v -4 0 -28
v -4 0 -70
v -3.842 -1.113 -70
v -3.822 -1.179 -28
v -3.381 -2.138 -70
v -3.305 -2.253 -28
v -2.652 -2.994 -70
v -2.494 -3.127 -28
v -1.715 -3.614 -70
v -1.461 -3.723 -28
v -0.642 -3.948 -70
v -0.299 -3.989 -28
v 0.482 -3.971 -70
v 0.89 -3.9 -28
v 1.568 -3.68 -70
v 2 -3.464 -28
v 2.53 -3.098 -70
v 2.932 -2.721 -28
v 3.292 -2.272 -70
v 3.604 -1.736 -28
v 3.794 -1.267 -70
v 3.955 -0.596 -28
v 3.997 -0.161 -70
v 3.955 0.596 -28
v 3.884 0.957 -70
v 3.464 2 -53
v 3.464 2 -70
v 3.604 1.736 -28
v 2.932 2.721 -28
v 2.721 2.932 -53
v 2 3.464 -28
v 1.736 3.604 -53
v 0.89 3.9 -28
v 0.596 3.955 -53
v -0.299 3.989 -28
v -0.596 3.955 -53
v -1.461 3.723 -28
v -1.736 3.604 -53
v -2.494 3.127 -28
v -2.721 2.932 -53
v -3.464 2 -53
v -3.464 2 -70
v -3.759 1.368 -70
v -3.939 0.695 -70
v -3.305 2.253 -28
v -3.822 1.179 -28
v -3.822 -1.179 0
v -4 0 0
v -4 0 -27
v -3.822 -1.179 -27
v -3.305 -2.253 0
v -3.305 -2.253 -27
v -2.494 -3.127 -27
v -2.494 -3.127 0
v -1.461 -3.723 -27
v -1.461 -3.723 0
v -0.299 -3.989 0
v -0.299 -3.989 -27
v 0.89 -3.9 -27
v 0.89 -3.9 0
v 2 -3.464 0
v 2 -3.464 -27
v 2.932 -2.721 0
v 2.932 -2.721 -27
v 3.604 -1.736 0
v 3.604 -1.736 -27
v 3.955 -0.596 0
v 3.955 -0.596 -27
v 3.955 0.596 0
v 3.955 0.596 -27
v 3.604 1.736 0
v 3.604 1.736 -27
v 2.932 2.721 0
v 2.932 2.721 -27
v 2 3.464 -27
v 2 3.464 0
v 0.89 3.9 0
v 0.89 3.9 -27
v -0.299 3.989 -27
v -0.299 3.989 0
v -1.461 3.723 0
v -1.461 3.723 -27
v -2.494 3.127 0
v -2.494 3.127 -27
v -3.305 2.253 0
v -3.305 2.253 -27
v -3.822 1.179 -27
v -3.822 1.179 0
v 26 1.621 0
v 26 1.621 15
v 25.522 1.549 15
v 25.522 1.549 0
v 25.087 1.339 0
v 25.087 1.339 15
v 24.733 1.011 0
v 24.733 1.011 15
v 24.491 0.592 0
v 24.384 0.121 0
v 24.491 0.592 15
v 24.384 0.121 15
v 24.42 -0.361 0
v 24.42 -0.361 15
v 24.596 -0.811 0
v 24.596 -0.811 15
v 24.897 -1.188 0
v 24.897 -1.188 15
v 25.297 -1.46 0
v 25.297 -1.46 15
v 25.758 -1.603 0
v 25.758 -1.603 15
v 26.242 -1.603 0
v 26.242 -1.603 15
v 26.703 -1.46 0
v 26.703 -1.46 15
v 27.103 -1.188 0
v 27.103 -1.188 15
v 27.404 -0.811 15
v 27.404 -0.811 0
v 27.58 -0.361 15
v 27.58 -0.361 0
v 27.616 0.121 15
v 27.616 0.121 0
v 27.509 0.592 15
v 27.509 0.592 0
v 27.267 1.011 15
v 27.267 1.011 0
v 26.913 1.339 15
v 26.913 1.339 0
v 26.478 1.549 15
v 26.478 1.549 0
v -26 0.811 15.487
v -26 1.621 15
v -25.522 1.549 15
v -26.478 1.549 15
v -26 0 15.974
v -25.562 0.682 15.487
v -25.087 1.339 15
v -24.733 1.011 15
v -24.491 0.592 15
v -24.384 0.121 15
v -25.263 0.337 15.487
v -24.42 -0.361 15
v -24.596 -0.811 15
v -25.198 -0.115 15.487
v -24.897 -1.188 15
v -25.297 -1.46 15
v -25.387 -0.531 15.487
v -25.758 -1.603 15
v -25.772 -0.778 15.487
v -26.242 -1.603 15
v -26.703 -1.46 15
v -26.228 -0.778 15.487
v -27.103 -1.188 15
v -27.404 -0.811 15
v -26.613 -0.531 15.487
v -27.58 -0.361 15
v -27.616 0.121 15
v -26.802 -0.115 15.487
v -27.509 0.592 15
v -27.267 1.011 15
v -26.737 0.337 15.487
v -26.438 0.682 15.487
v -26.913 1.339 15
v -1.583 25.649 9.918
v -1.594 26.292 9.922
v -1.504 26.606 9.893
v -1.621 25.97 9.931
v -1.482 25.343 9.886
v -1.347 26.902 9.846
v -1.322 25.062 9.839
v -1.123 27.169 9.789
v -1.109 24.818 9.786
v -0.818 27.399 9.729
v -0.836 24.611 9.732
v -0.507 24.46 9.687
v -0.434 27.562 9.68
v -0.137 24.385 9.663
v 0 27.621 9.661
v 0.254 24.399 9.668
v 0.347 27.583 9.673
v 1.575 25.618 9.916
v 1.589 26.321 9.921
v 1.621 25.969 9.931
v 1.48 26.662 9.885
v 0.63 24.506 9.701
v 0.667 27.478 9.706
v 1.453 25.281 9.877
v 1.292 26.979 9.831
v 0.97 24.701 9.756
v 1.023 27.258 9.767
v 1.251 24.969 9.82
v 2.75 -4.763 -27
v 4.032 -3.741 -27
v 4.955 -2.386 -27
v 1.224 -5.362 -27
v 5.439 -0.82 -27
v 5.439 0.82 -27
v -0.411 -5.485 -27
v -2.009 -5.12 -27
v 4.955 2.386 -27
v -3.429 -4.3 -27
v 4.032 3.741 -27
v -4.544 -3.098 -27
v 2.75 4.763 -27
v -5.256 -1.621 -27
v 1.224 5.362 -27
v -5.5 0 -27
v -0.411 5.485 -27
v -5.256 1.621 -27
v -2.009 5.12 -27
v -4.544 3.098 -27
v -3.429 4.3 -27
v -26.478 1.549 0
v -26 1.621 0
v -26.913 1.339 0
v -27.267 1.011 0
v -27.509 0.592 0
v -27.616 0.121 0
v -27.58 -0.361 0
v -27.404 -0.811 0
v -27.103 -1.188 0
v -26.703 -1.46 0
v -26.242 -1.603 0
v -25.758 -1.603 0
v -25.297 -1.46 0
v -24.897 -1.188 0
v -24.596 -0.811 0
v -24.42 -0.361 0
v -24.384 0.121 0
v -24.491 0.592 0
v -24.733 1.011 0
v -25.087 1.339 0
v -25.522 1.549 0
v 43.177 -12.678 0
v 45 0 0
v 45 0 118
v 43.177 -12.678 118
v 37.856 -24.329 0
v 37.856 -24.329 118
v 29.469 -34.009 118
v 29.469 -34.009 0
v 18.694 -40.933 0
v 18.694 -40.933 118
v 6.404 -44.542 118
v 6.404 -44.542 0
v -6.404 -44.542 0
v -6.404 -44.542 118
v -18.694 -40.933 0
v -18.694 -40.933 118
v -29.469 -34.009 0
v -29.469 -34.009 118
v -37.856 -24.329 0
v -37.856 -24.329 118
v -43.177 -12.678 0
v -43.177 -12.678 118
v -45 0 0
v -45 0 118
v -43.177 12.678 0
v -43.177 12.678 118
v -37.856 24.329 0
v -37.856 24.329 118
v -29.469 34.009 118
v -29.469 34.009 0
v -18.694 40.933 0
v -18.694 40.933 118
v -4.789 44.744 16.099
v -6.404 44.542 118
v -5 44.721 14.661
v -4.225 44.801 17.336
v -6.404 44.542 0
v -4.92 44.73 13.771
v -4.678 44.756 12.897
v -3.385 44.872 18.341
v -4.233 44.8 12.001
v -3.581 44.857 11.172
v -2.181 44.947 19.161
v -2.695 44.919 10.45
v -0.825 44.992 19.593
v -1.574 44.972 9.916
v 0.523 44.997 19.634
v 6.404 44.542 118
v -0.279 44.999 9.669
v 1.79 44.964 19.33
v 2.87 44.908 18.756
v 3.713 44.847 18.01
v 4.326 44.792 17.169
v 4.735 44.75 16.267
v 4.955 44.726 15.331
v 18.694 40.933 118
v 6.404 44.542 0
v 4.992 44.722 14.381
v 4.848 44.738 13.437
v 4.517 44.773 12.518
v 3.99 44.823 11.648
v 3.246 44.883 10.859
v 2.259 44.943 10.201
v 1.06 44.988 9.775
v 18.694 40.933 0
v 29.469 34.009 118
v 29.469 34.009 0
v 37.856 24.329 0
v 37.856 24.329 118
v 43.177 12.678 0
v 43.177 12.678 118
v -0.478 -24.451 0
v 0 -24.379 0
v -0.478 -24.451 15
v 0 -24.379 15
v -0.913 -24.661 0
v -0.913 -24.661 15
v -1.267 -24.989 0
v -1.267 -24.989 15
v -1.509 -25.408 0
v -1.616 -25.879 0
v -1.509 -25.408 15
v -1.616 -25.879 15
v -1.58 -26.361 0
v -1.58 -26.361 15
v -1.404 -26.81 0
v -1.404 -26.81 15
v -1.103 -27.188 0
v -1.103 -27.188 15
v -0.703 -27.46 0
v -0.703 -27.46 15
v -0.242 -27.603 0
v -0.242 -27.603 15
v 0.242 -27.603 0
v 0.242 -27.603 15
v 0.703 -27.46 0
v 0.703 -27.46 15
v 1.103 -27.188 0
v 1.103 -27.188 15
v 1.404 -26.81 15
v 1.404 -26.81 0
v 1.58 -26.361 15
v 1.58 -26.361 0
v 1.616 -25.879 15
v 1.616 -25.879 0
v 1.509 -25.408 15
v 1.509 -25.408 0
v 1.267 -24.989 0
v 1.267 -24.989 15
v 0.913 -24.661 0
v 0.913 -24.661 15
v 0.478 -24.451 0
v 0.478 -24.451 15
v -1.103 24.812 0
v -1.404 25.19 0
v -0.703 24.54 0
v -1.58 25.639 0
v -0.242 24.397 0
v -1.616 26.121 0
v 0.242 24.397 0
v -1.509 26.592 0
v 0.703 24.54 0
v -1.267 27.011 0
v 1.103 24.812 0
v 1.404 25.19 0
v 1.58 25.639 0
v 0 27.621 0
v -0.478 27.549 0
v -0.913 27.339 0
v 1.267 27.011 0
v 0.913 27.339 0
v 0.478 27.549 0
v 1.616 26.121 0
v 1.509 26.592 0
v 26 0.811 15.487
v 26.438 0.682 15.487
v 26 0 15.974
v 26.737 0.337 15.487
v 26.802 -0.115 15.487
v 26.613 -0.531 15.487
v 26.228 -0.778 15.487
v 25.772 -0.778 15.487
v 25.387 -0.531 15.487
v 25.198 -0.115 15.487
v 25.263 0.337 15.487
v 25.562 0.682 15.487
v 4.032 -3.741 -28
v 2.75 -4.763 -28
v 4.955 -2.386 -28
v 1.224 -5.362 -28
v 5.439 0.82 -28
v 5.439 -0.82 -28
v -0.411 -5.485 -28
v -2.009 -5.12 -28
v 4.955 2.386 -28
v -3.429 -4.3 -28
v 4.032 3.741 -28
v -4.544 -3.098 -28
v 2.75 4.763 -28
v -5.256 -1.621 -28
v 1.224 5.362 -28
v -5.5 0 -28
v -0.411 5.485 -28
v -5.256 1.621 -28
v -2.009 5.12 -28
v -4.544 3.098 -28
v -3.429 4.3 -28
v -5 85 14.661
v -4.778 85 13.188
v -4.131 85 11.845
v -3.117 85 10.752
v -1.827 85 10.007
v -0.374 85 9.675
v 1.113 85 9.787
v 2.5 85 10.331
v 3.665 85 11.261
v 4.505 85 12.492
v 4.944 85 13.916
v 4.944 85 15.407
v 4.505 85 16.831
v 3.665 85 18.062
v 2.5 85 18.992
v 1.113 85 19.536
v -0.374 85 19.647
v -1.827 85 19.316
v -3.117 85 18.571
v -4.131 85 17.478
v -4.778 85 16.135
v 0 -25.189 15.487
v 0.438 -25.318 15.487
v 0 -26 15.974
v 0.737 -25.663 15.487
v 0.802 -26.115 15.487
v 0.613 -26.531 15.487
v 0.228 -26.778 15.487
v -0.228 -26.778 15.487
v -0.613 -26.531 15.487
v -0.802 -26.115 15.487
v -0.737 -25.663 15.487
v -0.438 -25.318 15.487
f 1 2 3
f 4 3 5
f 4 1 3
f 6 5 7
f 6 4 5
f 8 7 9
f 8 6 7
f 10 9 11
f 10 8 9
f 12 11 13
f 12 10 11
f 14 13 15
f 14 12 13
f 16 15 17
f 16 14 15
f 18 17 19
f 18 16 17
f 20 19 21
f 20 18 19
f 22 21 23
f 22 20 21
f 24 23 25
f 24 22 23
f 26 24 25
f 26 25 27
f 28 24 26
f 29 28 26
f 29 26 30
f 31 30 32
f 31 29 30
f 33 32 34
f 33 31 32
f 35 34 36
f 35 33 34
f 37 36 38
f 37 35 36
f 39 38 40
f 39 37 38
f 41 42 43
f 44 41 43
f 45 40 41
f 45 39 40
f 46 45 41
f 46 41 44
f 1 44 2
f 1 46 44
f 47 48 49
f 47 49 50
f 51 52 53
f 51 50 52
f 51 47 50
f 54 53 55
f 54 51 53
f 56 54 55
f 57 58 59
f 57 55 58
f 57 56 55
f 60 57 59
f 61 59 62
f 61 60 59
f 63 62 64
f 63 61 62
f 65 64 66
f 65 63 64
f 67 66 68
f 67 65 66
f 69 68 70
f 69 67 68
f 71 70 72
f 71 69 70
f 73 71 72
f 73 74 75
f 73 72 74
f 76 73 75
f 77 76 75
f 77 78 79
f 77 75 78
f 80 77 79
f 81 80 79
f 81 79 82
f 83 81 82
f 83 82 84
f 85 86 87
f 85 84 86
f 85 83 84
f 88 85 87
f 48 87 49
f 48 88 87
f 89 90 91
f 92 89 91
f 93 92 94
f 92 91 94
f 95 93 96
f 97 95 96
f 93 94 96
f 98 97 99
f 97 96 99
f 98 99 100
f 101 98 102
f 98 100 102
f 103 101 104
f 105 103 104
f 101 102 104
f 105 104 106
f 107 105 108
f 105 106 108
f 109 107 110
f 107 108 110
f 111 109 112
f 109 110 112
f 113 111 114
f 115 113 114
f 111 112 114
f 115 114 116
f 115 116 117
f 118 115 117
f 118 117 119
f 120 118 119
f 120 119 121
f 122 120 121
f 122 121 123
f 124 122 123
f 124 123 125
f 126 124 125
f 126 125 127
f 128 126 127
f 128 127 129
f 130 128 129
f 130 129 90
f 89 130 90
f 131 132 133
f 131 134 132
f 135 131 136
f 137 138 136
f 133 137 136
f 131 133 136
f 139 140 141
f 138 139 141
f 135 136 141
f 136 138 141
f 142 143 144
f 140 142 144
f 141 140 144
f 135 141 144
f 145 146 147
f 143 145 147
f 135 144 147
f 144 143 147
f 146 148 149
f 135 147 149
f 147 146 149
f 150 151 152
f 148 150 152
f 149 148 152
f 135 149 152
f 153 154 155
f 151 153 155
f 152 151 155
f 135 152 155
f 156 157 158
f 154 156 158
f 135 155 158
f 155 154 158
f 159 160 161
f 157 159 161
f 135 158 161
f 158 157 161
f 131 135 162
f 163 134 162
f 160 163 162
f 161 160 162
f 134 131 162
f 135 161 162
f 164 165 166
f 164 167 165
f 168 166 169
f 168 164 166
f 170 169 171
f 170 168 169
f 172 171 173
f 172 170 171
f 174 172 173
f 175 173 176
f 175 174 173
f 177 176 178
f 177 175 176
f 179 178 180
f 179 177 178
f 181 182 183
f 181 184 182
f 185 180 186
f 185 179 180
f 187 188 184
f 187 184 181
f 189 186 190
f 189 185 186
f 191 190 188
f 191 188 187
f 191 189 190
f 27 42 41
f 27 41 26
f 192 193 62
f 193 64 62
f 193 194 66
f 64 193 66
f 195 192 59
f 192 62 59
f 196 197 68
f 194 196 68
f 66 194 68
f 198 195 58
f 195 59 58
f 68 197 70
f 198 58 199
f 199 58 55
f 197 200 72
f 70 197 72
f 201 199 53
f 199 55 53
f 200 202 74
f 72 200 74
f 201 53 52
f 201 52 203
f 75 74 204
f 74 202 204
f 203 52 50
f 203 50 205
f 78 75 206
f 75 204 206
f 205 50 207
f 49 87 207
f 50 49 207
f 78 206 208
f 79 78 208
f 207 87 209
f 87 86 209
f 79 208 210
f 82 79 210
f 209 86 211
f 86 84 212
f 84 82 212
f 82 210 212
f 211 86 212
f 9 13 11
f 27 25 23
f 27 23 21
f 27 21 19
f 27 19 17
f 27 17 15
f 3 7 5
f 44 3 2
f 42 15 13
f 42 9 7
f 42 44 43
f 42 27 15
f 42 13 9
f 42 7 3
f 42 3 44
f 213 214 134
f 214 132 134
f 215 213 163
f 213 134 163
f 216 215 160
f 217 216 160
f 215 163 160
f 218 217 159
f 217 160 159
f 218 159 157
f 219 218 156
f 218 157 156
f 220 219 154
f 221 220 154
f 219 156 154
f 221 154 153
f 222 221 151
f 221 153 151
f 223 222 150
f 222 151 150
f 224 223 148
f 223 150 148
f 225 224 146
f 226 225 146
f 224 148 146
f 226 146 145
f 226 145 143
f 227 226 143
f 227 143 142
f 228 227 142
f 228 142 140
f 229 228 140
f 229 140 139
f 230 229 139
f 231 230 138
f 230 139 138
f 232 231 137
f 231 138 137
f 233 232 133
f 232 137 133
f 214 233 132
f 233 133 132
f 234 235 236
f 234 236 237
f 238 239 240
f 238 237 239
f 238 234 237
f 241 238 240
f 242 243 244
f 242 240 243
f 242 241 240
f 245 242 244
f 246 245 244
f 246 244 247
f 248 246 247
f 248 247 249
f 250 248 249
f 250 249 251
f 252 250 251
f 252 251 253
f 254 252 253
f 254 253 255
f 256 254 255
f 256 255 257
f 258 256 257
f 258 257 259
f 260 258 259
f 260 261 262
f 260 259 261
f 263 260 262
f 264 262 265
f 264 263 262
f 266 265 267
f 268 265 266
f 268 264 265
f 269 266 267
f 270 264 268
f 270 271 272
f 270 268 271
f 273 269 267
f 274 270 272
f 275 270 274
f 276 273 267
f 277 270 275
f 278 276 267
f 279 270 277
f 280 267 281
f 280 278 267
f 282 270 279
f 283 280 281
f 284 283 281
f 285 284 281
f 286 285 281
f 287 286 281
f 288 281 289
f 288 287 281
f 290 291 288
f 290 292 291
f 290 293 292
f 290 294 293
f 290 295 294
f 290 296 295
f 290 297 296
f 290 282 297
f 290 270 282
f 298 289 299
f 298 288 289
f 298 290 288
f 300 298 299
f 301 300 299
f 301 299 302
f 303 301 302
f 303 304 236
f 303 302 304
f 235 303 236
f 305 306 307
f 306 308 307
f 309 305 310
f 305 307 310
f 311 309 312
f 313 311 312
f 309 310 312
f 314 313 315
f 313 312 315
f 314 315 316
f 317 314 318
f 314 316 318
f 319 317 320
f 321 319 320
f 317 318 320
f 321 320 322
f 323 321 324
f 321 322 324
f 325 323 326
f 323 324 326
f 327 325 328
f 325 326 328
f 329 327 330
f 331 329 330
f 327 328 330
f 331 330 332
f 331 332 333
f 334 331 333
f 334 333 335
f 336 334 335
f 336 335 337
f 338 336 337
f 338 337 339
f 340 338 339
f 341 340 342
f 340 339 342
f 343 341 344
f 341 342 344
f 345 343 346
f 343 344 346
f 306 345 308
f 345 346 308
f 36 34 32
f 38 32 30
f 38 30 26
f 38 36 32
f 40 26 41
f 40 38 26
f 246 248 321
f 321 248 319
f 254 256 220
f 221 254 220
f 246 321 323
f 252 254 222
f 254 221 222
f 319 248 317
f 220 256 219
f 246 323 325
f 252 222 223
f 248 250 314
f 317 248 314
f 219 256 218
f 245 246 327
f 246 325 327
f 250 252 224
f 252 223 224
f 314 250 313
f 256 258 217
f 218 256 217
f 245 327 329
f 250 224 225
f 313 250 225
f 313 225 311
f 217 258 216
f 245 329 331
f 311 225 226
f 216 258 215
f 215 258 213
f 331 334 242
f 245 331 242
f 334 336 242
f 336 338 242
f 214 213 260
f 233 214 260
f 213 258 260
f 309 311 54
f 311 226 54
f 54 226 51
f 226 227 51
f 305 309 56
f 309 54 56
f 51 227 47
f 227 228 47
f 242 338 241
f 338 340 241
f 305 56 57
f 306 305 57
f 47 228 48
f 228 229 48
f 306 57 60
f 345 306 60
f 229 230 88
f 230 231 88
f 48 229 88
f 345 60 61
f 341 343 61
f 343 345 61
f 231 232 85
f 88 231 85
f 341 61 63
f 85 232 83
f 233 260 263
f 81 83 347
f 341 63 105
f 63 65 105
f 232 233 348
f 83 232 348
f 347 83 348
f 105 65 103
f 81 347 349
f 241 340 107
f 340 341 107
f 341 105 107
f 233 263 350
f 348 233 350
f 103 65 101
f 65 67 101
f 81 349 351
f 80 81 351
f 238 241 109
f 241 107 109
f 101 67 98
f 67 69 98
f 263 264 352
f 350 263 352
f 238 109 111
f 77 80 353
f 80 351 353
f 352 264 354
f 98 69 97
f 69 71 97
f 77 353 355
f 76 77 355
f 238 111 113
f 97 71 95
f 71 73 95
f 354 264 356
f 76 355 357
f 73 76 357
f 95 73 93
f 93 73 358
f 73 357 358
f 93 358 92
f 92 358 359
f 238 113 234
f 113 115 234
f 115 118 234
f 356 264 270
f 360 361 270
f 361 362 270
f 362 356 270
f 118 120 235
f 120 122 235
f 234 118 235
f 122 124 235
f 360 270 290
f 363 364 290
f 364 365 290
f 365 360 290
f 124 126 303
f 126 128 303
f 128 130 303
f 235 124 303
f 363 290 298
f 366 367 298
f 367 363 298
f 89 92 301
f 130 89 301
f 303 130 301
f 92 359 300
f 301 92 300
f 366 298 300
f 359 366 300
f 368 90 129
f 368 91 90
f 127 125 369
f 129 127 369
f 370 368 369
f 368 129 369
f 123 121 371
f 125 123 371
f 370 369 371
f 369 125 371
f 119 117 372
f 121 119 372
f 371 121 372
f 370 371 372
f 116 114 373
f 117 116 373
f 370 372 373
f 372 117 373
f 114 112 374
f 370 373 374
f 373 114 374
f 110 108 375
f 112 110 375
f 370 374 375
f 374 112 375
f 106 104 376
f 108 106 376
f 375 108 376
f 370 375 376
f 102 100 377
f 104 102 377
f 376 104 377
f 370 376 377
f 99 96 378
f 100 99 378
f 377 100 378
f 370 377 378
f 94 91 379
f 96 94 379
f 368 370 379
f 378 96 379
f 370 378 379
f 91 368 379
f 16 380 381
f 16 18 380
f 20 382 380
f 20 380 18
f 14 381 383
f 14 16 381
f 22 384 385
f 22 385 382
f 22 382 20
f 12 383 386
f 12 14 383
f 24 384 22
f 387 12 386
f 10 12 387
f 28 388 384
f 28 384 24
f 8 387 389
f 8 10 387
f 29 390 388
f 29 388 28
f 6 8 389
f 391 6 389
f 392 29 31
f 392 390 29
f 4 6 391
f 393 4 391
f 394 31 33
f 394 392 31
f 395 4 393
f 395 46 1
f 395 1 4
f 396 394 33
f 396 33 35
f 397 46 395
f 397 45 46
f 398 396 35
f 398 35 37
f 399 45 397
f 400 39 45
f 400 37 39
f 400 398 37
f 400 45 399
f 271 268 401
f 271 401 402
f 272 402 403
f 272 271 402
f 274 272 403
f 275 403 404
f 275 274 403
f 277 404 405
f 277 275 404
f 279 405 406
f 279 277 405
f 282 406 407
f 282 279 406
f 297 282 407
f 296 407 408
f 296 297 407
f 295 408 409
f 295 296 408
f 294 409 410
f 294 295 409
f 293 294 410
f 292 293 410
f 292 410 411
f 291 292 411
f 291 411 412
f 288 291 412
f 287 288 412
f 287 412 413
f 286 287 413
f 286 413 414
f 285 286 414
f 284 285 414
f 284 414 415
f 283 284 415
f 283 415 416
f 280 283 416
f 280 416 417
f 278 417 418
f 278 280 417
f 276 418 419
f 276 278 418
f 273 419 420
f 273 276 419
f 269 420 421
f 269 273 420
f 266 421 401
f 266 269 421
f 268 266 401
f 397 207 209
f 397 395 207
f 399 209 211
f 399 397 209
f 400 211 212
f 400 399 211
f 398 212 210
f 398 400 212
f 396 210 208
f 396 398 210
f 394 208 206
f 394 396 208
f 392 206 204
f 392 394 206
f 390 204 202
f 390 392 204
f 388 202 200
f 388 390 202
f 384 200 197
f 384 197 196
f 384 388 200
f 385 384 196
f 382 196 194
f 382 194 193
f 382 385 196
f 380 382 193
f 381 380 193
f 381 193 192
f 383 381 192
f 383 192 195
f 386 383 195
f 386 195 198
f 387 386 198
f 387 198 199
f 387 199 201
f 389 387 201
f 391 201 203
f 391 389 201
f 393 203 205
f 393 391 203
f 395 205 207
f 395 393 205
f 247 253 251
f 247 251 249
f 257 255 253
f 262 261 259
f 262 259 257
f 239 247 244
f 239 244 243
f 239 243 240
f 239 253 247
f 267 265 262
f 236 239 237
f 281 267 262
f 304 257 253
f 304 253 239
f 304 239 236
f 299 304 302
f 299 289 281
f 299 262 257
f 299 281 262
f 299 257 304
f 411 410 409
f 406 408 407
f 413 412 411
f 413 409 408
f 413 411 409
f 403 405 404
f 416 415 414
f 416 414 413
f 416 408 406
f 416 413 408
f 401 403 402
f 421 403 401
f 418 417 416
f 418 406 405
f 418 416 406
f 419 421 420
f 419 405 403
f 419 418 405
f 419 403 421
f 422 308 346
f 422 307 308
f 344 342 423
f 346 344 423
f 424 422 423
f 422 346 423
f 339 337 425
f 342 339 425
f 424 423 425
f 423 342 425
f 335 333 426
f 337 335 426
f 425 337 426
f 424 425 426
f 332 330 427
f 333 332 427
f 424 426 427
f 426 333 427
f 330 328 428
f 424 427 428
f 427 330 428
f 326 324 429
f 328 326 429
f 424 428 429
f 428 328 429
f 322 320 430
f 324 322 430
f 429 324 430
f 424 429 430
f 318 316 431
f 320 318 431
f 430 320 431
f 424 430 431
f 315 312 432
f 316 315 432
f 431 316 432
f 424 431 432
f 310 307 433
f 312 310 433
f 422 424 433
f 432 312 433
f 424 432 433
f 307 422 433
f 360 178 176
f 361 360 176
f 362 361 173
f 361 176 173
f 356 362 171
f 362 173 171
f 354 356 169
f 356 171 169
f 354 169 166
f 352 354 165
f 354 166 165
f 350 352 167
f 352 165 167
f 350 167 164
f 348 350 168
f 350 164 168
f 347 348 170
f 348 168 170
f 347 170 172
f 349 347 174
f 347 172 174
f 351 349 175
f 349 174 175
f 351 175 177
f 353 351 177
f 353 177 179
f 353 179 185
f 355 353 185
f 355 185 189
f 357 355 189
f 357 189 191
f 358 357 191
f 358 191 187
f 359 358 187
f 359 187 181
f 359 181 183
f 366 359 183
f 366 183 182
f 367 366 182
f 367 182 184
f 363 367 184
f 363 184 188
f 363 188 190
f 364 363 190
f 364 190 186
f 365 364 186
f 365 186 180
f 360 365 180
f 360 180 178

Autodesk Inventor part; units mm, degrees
ref_plane "YZ Plane" through (0, 0, 0) normal (1, 0, 0) x (0, 1, 0)
ref_plane "XZ Plane" through (0, 0, 0) normal (0, 1, 0) x (-1, 0, 0)
sketch "Sketch2" plane through (0, 0, 0) normal (0, 0, 1) x (1, 0, 0)
  circle A0 centre (0, 0) radius 45
  dimension "d11" = 90
extrude "Extrusion2" add sketch "Sketch2" along normal blind 118
sketch "Sketch3" plane through (0, 0, 0) normal (0, 0, -1) x (-1, 0, 0)
  circle A0 centre (0, 0) radius 4
  dimension "d14" = 8
extrude "Extrusion3" add sketch "Sketch3" along normal blind 70
thread "Thread1" size "M8x1.25" class "6g" standard "ANSI Metric M Profile" length 17
sketch "Sketch4" plane through (0, 0, -70) normal (0, 0, -1) x (-1, 0, 0)
  line L0 (3.4641, 2) -> (-3.4641, 2)
  arc A0 (3.4641, 2) -> (-3.4641, 2) centre (0, 0) ccw
  circle A1 centre (0, 0) radius 4 projected
  dimension "d19" = 2
extrude "Extrusion4" cut sketch "Sketch4" against normal blind 17 contours L0 A0
ref_plane "Work Plane1" through (0, 0, -28) normal (0, 0, -1) x (-1, 0, 0)
sketch "Sketch5" plane through (0, 0, -28) normal (0, 0, -1) x (-1, 0, 0)
  circle A0 centre (0, 0) radius 4 projected
  circle A1 centre (0, 0) radius 5.5
  dimension "d23" = 1.5
extrude "Extrusion5" add sketch "Sketch5" against normal blind 1
sketch "Sketch6" plane through (0, 0, 0) normal (0, 0, -1) x (-1, 0, 0)
  circle A0 centre (0, 0) radius 26 construction
  point P0 (0, -26)
  point P1 (-26, 0)
  point P2 (0, 26)
  point P3 (26, 0)
  dimension "d26" = 52
hole "Hole1" at (0, -26, 0) at (26, 0, 0) at (0, 26, 0) at (-26, 0, 0) direction (0, 0, 1) diameter 3.242 depth 15 tip angle 118 thread size "M4x0.7" class "6H" standard "ANSI Metric M Profile"
sketch "Sketch7" plane through (0, 0, 0) normal (0, 1, 0) x (-1, 0, 0)
  circle A0 centre (0, 14.6614) radius 5
  point P0 (0, 0)
  dimension "d34" = 10
extrude "Extrusion6" add sketch "Sketch7" along normal blind 85
properties part number "P01 - Fan Motor" material "SAE 1020"
